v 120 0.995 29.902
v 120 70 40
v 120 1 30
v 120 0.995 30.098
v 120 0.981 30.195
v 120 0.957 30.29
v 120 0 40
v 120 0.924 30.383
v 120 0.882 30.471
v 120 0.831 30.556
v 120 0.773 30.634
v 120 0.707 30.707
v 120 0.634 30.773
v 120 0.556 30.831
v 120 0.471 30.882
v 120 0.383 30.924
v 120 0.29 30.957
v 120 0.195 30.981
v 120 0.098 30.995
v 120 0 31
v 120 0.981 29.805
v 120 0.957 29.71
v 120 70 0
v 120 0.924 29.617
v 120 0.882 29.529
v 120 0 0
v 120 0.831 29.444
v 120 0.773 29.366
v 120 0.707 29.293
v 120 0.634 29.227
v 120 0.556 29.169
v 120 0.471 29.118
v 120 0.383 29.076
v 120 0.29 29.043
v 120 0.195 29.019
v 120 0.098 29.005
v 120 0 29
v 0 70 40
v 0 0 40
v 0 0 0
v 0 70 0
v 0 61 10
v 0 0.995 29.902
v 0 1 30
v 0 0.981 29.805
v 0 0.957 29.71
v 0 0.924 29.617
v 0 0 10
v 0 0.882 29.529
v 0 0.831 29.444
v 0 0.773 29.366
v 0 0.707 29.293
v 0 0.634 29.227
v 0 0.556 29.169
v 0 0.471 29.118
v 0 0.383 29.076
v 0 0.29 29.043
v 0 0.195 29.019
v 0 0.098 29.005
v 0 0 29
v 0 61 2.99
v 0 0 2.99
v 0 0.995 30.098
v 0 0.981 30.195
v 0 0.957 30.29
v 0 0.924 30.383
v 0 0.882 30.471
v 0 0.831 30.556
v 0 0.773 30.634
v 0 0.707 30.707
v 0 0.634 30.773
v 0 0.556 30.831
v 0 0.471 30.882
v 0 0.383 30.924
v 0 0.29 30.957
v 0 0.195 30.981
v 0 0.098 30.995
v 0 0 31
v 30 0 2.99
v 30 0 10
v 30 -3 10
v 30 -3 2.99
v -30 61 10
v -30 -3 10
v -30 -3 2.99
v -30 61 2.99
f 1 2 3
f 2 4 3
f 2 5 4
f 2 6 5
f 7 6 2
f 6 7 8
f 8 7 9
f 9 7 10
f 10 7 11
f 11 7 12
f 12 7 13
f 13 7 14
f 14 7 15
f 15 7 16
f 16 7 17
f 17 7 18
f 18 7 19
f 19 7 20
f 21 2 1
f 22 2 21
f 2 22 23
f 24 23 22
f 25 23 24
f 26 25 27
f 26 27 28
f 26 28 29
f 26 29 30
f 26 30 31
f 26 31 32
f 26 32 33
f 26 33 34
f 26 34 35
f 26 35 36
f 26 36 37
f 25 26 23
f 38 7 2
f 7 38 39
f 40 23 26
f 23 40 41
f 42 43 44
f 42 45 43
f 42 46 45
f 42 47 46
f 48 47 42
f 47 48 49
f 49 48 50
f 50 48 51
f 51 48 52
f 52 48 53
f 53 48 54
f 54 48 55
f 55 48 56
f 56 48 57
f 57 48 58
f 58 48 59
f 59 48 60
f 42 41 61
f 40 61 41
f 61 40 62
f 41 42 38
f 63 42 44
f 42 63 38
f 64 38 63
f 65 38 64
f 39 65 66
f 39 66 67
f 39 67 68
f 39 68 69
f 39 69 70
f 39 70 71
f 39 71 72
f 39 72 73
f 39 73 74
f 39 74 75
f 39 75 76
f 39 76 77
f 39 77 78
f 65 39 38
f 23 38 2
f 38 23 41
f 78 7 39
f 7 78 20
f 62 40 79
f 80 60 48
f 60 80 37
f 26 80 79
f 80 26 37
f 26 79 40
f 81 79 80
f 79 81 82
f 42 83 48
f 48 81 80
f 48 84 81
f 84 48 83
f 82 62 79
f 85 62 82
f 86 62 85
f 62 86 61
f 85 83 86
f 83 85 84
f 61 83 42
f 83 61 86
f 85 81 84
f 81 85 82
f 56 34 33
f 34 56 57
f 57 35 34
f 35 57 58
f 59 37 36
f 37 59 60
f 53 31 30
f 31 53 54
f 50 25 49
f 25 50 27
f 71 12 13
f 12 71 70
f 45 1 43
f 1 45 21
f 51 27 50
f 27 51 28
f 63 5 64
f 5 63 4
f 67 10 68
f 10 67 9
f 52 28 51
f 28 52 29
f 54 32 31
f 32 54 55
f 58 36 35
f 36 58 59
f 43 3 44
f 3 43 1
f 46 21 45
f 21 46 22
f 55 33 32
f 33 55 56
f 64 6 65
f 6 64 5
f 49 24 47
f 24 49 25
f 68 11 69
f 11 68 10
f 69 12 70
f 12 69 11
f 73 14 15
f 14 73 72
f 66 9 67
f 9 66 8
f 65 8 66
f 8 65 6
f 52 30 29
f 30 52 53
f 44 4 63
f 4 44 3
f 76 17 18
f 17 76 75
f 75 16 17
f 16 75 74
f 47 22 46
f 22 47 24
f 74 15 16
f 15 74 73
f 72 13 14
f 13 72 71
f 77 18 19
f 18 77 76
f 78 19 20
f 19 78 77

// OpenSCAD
// Mini horizontal gel-electrophoresis box - buffer tank
// Print orientation: tank on XY plane, open top, builds up +Z

// ---------- Dimensions (mm) ----------
outer_x      = 120;  // tank outer length (X)
outer_y      = 70;   // tank outer width (Y)
outer_h      = 40;   // tank outer height (Z)
wall         = 3;    // tank wall thickness
floor        = 3;    // tank floor thickness

platform_x   = 60;   // platform length (X)
platform_w   = outer_y - 2*wall;  // platform width = inner width (Y)
platform_top = 10;   // platform top height above inner floor

hole_d       = 2;    // electrode hole diameter
hole_z       = 30;   // electrode hole height (Z)
hole_y       = 0;    // electrode hole Y position

eps          = 0.5;  // cutter overshoot

$fn = 64;

// ---------- Model ----------
difference() {
    union() {
        // Tank body
        cube([outer_x, outer_y, outer_h]);
        // Raised platform (starts below inner floor, extends to platform_top)
        translate([-platform_x/2, -wall, floor - 0.01])
            cube([platform_x, platform_w, platform_top - floor + 0.01]);
    }
    // End-wall holes along X
    for (sx = [-1, 1])
        translate([sx * (outer_x/2 - eps), hole_y, hole_z])
            rotate([0, 90, 0])
                cylinder(d = hole_d, h = outer_x + 2*eps);
}
